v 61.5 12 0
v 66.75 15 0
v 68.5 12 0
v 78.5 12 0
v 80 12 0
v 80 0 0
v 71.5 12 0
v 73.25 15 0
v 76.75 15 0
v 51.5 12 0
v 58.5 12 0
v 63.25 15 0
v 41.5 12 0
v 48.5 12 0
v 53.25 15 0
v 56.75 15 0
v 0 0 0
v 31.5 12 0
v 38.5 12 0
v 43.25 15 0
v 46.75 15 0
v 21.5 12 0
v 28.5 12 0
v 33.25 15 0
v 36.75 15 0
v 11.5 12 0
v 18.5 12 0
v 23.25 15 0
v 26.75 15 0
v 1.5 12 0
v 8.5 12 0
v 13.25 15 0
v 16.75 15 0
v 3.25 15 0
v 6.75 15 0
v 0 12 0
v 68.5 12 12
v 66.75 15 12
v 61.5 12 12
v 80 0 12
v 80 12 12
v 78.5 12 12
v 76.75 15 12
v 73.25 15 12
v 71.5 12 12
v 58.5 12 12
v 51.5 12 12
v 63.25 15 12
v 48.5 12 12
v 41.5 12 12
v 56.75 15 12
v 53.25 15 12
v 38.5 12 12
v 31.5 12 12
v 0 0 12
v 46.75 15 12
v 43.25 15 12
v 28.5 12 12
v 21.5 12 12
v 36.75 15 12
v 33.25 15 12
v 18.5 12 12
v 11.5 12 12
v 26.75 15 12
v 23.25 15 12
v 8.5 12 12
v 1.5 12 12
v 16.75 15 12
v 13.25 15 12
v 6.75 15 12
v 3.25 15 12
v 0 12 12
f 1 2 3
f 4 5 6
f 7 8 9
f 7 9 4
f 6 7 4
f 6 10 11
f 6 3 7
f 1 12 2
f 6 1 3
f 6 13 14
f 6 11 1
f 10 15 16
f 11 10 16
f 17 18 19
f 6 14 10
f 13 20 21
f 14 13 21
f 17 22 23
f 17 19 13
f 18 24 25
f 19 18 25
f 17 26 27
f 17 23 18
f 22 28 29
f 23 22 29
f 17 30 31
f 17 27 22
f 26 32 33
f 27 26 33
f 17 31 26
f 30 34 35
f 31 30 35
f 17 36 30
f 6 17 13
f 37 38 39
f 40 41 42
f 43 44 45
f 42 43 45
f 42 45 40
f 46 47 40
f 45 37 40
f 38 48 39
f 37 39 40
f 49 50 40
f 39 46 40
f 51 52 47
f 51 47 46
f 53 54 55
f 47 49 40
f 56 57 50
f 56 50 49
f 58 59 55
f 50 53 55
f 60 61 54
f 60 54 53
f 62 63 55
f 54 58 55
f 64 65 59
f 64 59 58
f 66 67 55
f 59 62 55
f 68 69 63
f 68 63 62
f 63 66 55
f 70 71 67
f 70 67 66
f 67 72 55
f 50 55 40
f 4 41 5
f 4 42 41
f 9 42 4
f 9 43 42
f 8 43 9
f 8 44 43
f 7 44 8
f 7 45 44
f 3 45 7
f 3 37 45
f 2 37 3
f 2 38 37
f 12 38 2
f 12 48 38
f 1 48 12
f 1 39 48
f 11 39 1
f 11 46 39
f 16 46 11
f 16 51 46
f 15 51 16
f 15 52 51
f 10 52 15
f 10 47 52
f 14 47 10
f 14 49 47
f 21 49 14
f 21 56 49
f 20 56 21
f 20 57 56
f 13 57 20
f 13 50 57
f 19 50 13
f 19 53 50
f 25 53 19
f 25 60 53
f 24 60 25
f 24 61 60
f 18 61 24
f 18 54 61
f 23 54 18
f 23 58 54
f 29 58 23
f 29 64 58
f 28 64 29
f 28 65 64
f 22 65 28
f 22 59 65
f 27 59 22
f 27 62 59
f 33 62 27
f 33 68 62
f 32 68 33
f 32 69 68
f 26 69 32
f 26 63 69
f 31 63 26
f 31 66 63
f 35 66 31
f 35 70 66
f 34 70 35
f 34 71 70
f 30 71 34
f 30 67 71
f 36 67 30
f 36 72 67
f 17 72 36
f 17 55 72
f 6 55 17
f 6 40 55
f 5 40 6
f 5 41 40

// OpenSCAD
$fn = 32;

// ----------------------------------------------------------------------
// Gear rack: 8 teeth, pitch 10 mm
// ----------------------------------------------------------------------

// --- parameters (mm) ---
teeth = 8;                // number of teeth
pitch = 10;               // tooth pitch, X
root_w = 7;               // tooth width at the root
tip_w = 3.5;              // tooth width at the tip
base_h = 12;              // rack body height, Y
tooth_h = 3;              // tooth height above the body
plate_t = 12;             // rack width, Z (extrusion height)

rack_l = teeth * pitch;  // overall length
total_h = base_h + tooth_h;  // overall height

profile = [[0, 0], [80, 0], [80, 12], [78.5, 12], [76.75, 15], [73.25, 15], [71.5, 12], [68.5, 12], [66.75, 15], [63.25, 15], [61.5, 12], [58.5, 12], [56.75, 15], [53.25, 15], [51.5, 12], [48.5, 12], [46.75, 15], [43.25, 15], [41.5, 12], [38.5, 12], [36.75, 15], [33.25, 15], [31.5, 12], [28.5, 12], [26.75, 15], [23.25, 15], [21.5, 12], [18.5, 12], [16.75, 15], [13.25, 15], [11.5, 12], [8.5, 12], [6.75, 15], [3.25, 15], [1.5, 12], [0, 12]];  // primary outline, 36 points, counter clockwise

// --- the one profile operation ---
linear_extrude(height = plate_t) polygon(points = profile);
